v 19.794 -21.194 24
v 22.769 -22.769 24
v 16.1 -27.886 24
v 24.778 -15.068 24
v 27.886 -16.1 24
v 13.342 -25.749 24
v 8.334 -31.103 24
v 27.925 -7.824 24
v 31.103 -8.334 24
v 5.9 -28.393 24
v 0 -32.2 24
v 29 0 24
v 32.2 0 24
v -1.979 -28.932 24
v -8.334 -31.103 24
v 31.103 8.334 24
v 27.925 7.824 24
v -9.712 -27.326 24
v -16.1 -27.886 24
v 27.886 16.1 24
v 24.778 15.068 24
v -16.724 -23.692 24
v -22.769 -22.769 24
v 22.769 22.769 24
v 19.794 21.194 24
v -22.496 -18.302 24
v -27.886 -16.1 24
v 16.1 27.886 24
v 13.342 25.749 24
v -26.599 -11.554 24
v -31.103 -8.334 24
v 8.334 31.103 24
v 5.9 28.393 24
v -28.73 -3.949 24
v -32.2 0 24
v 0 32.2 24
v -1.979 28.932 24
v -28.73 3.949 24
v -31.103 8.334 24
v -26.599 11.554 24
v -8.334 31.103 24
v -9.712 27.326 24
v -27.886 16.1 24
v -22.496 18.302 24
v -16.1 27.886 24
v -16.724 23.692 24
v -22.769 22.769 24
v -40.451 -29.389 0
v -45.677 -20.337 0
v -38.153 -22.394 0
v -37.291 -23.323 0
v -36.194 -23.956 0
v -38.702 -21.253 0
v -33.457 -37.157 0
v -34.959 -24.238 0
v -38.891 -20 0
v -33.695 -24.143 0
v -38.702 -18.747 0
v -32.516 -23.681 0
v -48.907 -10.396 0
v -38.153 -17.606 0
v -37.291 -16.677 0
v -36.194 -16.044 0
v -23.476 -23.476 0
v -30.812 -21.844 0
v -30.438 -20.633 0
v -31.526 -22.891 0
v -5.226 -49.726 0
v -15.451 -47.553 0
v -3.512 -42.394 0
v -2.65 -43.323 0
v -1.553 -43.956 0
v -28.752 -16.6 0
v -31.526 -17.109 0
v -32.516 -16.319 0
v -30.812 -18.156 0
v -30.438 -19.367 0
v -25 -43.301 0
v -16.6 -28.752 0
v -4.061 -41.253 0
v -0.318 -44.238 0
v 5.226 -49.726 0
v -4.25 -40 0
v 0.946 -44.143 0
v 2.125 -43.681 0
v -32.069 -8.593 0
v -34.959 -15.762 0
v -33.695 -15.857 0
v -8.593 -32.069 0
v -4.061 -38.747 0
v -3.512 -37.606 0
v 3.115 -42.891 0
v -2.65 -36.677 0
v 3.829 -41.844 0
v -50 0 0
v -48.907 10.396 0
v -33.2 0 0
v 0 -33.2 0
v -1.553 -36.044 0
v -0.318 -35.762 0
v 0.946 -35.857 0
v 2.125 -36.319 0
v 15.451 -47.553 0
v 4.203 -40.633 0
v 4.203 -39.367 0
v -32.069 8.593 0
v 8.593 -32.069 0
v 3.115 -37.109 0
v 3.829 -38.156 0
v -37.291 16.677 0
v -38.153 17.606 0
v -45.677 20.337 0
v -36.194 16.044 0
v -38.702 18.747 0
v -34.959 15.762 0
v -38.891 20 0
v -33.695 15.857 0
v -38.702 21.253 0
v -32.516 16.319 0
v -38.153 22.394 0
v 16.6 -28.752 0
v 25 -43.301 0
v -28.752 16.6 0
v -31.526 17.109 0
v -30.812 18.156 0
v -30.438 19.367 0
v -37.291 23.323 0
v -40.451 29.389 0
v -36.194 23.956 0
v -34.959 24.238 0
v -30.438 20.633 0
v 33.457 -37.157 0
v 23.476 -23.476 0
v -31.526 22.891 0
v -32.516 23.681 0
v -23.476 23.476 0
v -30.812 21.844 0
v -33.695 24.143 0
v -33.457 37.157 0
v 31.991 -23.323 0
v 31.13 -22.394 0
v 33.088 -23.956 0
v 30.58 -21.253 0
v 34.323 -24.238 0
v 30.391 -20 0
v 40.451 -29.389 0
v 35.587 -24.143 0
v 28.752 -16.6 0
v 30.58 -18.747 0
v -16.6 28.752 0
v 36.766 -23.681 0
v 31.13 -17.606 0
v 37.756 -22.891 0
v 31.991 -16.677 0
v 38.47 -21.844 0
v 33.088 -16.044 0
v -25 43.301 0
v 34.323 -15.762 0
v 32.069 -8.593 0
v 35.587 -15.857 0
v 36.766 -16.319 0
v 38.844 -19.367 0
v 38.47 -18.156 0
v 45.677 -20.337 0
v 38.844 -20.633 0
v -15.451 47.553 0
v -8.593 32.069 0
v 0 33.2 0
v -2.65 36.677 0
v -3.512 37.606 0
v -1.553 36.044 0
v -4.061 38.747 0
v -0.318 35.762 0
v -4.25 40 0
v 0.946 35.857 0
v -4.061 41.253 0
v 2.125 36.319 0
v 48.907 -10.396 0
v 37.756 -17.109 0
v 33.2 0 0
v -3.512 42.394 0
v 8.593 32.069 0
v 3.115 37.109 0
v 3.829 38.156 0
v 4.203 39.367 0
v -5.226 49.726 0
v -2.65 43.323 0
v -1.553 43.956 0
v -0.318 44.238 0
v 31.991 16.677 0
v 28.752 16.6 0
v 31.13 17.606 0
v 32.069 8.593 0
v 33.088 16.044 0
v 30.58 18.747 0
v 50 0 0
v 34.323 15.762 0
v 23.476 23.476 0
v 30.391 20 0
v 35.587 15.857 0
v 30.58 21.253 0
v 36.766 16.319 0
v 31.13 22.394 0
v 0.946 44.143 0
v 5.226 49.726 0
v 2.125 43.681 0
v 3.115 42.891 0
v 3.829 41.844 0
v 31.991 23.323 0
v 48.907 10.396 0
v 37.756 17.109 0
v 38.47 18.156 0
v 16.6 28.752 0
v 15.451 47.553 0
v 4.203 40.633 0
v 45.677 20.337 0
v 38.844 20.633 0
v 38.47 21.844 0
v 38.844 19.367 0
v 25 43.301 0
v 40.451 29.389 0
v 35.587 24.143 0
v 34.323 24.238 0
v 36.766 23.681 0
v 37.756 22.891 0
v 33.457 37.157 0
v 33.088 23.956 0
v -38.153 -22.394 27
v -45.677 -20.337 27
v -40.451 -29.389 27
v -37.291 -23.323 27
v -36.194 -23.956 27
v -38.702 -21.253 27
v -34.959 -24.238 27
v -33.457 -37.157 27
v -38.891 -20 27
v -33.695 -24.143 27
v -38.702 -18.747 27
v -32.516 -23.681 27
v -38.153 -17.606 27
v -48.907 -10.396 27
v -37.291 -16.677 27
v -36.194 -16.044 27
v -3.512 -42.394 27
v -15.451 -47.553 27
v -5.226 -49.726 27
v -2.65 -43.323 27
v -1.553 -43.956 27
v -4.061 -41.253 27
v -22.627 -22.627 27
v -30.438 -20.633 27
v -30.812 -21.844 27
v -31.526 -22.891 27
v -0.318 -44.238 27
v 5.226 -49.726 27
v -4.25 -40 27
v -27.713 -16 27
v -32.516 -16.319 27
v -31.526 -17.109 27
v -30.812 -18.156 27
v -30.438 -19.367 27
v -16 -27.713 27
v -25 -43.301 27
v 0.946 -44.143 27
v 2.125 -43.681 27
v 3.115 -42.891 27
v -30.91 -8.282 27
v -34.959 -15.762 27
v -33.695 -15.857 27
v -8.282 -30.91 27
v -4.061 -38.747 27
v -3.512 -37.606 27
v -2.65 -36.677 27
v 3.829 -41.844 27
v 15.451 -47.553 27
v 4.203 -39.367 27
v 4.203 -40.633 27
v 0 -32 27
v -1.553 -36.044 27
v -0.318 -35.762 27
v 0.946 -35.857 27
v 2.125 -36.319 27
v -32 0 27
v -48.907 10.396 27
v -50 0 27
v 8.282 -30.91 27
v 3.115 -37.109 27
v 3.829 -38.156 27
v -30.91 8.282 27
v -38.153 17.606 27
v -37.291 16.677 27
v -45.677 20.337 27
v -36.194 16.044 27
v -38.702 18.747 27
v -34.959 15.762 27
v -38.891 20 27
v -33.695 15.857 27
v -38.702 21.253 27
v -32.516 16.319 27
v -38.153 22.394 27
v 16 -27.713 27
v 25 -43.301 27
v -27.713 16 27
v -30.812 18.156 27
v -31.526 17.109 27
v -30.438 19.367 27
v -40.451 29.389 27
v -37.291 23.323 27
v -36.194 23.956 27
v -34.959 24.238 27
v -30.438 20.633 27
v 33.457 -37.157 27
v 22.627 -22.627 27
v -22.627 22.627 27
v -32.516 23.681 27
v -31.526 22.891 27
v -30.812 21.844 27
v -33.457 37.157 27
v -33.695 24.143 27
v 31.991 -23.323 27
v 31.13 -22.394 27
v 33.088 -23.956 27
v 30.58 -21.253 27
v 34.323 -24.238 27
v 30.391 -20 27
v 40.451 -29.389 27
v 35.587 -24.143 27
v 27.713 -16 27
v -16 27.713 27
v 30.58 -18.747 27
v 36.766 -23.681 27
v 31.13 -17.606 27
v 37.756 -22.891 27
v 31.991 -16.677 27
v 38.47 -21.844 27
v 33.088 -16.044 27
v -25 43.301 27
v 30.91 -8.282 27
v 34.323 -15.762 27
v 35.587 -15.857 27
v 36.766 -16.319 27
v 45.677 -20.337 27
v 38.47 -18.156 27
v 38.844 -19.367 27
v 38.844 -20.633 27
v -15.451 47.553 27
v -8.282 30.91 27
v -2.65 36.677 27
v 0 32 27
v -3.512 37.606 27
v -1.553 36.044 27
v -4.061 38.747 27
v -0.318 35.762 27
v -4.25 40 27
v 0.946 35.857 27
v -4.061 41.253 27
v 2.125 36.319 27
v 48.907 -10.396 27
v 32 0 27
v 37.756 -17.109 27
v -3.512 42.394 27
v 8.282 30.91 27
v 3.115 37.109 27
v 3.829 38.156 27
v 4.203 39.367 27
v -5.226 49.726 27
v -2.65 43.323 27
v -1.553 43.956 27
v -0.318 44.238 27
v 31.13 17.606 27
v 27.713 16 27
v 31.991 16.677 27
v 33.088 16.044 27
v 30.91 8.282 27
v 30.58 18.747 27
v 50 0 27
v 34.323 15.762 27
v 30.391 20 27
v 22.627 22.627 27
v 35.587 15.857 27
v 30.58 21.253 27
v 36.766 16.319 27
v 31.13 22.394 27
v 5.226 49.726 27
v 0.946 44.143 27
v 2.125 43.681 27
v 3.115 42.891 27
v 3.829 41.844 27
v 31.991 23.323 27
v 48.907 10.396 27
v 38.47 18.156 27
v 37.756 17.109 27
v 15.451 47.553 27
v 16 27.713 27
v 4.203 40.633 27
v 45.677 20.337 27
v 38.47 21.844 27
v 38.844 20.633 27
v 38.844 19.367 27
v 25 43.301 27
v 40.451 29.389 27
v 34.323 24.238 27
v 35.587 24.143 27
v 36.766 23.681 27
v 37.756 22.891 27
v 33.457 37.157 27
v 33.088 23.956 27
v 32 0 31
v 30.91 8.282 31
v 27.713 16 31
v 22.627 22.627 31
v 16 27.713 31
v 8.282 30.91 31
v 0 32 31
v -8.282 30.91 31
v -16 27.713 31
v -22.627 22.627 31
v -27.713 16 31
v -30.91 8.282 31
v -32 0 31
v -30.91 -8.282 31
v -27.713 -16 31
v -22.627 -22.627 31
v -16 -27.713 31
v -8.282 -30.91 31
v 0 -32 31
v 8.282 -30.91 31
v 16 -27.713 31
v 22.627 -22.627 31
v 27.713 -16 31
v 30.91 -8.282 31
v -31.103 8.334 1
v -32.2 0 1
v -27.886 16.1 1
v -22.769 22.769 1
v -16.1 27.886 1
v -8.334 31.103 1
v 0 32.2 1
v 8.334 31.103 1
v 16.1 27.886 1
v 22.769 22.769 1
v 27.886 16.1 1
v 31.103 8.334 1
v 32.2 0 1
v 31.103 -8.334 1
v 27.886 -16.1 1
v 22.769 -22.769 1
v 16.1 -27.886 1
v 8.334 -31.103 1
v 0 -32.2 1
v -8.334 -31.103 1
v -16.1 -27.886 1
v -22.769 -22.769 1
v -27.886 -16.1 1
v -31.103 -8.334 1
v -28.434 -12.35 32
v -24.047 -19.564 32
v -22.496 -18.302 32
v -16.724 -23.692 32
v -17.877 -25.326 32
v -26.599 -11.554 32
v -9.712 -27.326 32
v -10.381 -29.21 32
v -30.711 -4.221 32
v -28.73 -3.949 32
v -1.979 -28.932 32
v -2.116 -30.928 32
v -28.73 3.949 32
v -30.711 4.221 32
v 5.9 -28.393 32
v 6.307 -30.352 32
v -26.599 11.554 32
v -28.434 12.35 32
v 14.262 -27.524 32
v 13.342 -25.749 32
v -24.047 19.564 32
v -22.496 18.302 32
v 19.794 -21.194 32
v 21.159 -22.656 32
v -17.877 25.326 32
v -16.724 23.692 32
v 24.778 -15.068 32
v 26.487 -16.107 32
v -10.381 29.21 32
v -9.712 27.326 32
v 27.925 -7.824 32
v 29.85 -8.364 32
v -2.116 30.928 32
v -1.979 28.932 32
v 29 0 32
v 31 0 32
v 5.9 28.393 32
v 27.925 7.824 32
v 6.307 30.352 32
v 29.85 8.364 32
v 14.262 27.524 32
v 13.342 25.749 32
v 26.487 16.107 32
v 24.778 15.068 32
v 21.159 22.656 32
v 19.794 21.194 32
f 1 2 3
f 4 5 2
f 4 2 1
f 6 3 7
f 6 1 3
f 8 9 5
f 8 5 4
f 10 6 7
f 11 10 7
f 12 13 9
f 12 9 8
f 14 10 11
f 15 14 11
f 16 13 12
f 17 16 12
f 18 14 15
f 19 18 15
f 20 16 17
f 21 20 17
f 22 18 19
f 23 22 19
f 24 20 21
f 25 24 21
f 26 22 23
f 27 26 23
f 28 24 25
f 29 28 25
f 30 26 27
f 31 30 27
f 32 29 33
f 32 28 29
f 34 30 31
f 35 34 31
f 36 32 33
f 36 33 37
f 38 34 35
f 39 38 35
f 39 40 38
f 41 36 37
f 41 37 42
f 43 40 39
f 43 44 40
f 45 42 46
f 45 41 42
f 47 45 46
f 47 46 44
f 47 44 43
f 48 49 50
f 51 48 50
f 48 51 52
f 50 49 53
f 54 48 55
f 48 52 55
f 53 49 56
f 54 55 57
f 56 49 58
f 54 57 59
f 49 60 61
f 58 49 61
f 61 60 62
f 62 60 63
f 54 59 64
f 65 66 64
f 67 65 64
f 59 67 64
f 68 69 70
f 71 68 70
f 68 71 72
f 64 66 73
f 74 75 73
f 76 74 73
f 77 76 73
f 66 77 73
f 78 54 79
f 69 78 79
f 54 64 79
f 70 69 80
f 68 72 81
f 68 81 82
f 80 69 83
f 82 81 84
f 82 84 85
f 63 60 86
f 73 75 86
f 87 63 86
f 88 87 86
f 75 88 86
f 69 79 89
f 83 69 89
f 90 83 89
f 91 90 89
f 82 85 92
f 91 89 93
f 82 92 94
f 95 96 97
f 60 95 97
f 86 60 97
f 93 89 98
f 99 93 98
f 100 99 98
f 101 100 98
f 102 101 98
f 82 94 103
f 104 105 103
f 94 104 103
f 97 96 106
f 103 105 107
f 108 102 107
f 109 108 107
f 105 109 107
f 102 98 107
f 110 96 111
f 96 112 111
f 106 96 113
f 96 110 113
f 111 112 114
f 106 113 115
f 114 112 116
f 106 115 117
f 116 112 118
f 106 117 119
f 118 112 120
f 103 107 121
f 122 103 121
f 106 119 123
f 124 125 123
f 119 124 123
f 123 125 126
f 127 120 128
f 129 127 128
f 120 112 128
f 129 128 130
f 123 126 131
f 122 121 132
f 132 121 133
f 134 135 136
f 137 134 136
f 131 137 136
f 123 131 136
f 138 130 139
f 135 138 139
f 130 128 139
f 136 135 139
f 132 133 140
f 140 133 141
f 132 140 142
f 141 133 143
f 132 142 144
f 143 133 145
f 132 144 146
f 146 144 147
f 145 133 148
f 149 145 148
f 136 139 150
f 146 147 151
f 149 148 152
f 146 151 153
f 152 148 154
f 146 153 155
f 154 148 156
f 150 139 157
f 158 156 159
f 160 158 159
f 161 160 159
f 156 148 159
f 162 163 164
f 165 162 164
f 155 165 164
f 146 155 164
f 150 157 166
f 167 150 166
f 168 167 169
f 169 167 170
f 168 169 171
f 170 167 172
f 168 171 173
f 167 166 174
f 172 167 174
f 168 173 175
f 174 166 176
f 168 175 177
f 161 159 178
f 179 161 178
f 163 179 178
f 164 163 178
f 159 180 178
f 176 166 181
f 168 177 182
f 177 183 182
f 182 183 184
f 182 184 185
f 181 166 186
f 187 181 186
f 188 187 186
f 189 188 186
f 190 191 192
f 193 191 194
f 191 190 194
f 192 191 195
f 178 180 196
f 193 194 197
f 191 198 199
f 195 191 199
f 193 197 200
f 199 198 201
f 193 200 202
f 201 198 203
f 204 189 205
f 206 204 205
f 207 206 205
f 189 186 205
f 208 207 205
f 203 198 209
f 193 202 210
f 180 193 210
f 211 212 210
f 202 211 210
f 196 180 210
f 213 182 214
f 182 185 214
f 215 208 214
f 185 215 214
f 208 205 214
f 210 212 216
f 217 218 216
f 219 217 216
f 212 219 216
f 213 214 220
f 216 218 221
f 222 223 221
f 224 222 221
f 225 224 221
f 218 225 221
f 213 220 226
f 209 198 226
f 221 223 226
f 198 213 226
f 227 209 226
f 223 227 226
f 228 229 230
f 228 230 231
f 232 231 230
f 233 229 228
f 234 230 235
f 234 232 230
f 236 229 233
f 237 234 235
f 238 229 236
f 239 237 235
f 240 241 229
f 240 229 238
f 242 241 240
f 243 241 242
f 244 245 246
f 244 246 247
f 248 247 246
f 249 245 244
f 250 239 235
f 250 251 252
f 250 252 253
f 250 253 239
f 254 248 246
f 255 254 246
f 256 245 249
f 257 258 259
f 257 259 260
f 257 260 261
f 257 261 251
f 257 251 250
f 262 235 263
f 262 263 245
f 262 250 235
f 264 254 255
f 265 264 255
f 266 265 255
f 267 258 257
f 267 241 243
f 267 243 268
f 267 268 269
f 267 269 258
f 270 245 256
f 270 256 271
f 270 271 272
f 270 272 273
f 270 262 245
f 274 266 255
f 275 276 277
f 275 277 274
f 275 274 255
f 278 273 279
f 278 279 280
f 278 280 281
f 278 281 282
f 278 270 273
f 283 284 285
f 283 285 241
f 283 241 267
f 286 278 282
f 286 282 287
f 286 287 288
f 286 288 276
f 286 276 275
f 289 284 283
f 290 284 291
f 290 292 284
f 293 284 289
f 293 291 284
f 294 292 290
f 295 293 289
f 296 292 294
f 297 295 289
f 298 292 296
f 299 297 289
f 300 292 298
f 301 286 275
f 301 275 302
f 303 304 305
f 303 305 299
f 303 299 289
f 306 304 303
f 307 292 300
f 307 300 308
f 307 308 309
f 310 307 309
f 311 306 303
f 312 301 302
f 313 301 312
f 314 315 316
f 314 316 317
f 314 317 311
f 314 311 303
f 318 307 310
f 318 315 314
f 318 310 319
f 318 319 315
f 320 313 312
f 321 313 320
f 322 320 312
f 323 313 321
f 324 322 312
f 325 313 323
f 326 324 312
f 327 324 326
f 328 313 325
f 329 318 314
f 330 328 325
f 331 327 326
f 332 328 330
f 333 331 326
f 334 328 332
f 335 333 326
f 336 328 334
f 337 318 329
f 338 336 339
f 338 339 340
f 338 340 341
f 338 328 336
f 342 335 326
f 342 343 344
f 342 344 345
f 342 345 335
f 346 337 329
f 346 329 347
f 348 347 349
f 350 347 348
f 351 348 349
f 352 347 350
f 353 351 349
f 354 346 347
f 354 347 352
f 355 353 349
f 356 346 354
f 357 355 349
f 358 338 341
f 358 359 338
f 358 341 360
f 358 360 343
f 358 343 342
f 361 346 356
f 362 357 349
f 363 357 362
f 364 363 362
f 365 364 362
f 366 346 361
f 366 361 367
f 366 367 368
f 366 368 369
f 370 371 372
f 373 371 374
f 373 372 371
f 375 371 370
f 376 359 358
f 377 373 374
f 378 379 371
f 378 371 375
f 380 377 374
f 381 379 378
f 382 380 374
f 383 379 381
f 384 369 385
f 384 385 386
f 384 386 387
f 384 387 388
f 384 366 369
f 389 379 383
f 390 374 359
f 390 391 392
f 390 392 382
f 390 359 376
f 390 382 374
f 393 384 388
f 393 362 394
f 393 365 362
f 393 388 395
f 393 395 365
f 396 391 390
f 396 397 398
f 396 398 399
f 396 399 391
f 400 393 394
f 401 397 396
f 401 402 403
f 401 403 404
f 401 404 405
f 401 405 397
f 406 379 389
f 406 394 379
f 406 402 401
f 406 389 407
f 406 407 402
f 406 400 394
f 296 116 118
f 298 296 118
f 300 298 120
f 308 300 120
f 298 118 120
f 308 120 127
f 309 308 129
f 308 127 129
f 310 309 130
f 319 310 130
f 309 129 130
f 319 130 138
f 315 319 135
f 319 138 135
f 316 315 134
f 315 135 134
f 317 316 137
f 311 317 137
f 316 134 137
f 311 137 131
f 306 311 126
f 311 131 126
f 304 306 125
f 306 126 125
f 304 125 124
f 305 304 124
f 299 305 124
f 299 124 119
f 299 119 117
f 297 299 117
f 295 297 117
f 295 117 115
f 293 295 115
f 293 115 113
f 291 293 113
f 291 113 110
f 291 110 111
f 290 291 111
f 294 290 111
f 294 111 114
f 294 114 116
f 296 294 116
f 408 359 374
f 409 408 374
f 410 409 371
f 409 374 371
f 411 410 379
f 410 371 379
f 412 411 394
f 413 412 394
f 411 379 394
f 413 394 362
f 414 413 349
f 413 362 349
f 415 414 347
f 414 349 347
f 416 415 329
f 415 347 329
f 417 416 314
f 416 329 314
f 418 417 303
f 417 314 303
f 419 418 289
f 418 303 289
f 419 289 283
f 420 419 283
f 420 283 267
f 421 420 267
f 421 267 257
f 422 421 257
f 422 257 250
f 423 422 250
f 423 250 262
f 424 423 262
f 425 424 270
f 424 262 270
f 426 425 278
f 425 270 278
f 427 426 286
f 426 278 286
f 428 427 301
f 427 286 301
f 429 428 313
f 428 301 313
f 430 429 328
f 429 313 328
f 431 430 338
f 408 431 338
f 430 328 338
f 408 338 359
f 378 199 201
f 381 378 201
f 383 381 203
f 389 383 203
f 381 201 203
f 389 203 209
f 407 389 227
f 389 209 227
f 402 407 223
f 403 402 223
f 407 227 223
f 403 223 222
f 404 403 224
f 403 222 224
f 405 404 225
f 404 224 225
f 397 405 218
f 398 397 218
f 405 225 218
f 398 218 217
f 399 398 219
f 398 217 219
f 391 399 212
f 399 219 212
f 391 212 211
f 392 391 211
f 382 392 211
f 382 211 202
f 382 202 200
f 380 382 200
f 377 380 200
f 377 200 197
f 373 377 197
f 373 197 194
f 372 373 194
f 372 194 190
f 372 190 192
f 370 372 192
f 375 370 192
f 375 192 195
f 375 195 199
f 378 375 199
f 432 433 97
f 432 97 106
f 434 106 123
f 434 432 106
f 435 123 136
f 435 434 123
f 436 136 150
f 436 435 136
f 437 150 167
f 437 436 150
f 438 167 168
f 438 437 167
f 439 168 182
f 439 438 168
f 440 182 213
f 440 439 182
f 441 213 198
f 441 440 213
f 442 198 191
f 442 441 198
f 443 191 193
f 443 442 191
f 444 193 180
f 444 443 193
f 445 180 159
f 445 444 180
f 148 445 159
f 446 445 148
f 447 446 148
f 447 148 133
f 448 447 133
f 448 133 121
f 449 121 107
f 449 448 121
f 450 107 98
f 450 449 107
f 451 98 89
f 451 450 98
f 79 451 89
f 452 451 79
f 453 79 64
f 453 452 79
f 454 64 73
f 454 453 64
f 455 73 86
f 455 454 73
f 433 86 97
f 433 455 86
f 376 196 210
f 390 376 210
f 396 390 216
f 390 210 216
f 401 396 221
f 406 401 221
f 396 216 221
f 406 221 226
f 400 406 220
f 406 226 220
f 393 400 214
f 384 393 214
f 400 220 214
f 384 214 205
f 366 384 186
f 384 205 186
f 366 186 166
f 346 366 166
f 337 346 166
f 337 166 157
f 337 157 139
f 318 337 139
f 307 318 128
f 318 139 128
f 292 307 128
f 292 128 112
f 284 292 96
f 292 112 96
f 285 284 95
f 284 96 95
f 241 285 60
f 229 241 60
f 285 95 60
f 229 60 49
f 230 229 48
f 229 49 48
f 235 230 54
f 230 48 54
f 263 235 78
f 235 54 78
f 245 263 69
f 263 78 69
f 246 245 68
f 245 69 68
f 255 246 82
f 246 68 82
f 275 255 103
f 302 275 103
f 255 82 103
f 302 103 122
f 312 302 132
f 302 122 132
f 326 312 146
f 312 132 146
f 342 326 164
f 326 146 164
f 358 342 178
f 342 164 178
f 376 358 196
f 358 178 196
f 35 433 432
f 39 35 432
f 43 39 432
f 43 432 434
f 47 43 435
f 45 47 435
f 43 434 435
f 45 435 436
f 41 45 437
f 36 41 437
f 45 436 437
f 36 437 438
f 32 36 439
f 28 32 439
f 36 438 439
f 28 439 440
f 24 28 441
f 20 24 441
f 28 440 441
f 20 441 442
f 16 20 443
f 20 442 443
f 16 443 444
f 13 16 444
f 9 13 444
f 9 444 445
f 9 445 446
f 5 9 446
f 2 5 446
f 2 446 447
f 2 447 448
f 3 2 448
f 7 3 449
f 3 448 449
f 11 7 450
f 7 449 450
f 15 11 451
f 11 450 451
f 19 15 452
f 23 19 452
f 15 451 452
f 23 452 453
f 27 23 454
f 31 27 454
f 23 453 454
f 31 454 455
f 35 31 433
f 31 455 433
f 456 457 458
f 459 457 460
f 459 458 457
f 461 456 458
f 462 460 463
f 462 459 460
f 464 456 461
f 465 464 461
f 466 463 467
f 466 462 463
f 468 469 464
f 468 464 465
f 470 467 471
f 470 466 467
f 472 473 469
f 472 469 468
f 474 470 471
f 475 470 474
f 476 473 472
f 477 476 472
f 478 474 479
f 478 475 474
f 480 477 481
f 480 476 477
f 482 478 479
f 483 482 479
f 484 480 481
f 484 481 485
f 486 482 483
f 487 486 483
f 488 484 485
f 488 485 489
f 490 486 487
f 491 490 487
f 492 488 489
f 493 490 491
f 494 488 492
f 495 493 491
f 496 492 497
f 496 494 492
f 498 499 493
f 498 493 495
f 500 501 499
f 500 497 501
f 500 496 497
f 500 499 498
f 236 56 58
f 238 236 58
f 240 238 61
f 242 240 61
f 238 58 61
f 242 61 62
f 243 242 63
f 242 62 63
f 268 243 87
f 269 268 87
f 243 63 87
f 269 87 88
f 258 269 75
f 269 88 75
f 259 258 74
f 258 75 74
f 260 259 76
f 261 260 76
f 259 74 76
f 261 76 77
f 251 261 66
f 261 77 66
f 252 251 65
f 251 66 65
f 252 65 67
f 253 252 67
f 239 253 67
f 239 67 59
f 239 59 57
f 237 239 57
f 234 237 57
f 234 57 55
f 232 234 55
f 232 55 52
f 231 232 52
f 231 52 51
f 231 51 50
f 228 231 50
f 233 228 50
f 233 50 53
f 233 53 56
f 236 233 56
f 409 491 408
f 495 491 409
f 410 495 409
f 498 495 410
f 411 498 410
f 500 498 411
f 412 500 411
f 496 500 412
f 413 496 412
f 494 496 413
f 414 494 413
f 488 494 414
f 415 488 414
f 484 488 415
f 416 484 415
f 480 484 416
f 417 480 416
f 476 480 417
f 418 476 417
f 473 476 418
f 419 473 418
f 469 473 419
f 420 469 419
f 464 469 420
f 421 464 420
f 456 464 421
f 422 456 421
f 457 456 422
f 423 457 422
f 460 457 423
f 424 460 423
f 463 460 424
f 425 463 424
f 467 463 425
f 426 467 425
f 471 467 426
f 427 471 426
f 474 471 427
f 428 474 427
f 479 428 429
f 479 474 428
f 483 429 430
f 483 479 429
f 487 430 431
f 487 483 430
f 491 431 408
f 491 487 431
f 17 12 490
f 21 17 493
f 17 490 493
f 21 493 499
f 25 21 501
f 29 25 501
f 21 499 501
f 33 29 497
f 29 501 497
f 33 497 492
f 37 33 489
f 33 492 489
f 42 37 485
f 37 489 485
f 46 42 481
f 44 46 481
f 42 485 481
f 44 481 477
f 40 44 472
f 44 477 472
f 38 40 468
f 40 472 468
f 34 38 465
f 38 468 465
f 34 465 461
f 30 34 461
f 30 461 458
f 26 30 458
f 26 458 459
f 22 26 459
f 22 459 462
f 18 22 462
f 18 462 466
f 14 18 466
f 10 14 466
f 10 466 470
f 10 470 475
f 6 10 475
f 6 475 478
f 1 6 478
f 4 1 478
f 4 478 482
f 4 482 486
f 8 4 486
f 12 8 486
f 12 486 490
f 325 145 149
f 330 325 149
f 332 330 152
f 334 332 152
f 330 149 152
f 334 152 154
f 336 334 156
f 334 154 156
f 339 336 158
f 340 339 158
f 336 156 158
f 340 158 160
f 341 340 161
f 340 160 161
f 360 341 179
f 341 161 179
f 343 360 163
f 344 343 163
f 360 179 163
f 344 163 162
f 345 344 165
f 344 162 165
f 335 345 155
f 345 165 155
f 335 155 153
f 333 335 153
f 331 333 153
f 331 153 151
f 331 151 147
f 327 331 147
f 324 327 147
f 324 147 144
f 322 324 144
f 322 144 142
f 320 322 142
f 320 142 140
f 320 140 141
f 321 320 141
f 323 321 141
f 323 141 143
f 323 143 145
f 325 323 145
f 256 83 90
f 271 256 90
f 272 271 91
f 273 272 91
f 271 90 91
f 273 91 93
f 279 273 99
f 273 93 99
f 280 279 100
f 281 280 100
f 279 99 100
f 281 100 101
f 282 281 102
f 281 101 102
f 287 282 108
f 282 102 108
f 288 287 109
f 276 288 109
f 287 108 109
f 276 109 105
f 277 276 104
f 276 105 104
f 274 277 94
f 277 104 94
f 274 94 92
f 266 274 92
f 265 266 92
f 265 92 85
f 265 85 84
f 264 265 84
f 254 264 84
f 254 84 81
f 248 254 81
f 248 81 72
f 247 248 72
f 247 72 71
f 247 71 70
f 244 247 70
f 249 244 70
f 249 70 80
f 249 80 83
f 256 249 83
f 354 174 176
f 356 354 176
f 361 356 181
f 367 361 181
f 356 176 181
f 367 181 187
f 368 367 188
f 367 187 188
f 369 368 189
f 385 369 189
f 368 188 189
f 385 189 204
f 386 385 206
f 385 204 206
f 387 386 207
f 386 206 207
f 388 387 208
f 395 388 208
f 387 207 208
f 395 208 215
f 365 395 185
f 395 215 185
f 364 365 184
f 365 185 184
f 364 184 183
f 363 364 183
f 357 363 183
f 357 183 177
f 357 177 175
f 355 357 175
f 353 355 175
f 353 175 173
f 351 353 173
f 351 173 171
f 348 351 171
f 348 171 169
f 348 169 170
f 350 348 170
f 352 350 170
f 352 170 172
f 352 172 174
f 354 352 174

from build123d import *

# Parameters (mm, degrees)
ESQUISSE2_R             = 50
BOSS_EXTRU_1_DEPTH      = 27
ESQUISSE3_R             = 32.2
ENL_V_MAT_EXTRU_1_DEPTH = 24
ESQUISSE4_R             = 32
BOSS_EXTRU_2_DEPTH      = 5
ESQUISSE5_R             = 29
ENL_V_MAT_EXTRU_2_DEPTH = 33
ESQUISSE6_R             = 4.25
ENL_V_MAT_EXTRU_3_DEPTH = 33
CHANFREIN1_SIZE         = 1


with BuildPart() as part:
    # Esquisse2 → Boss.-Extru.1 (new body)
    with BuildSketch(Plane.XY):
        Circle(ESQUISSE2_R)
    extrude(amount=BOSS_EXTRU_1_DEPTH)

    # Esquisse3 → Enlèv. mat.-Extru.1 (cut)
    with BuildSketch(Plane(origin=(0, 0, 0), x_dir=(-1, 0, 0), z_dir=(0, 0, -1))):
        Circle(ESQUISSE3_R)
    extrude(amount=-ENL_V_MAT_EXTRU_1_DEPTH, mode=Mode.SUBTRACT)

    # Esquisse4 → Boss.-Extru.2 (add)
    with BuildSketch(Plane.XY.offset(27)):
        Circle(ESQUISSE4_R)
    extrude(amount=BOSS_EXTRU_2_DEPTH)

    # Esquisse5 → Enlèv. mat.-Extru.2 (cut, through all)
    with BuildSketch(Plane.XY.offset(32)):
        Circle(ESQUISSE5_R)
    extrude(amount=-ENL_V_MAT_EXTRU_2_DEPTH, mode=Mode.SUBTRACT)

    # Esquisse6 → Enlèv. mat.-Extru.3 (cut, through all)
    with BuildSketch(Plane(origin=(0, 0, 0), x_dir=(-1, 0, 0), z_dir=(0, 0, -1))):
        with Locations((0, 40)):
            Circle(ESQUISSE6_R)
        with Locations((34.641016151, 20)):
            Circle(ESQUISSE6_R)
        with Locations((34.641016151, -20)):
            Circle(ESQUISSE6_R)
        with Locations((0, -40)):
            Circle(ESQUISSE6_R)
        with Locations((-34.641016151, -20)):
            Circle(ESQUISSE6_R)
        with Locations((-34.641016151, 20)):
            Circle(ESQUISSE6_R)
    extrude(amount=-ENL_V_MAT_EXTRU_3_DEPTH, mode=Mode.SUBTRACT)

    # Chanfrein1
    chanfrein1_edges = [part.edges().sort_by_distance(p)[0] for p in [
        (-32, 0, 32),
        (32.2, 0, 0),
    ]]
    chamfer(chanfrein1_edges, length=CHANFREIN1_SIZE)


solid = part.part
